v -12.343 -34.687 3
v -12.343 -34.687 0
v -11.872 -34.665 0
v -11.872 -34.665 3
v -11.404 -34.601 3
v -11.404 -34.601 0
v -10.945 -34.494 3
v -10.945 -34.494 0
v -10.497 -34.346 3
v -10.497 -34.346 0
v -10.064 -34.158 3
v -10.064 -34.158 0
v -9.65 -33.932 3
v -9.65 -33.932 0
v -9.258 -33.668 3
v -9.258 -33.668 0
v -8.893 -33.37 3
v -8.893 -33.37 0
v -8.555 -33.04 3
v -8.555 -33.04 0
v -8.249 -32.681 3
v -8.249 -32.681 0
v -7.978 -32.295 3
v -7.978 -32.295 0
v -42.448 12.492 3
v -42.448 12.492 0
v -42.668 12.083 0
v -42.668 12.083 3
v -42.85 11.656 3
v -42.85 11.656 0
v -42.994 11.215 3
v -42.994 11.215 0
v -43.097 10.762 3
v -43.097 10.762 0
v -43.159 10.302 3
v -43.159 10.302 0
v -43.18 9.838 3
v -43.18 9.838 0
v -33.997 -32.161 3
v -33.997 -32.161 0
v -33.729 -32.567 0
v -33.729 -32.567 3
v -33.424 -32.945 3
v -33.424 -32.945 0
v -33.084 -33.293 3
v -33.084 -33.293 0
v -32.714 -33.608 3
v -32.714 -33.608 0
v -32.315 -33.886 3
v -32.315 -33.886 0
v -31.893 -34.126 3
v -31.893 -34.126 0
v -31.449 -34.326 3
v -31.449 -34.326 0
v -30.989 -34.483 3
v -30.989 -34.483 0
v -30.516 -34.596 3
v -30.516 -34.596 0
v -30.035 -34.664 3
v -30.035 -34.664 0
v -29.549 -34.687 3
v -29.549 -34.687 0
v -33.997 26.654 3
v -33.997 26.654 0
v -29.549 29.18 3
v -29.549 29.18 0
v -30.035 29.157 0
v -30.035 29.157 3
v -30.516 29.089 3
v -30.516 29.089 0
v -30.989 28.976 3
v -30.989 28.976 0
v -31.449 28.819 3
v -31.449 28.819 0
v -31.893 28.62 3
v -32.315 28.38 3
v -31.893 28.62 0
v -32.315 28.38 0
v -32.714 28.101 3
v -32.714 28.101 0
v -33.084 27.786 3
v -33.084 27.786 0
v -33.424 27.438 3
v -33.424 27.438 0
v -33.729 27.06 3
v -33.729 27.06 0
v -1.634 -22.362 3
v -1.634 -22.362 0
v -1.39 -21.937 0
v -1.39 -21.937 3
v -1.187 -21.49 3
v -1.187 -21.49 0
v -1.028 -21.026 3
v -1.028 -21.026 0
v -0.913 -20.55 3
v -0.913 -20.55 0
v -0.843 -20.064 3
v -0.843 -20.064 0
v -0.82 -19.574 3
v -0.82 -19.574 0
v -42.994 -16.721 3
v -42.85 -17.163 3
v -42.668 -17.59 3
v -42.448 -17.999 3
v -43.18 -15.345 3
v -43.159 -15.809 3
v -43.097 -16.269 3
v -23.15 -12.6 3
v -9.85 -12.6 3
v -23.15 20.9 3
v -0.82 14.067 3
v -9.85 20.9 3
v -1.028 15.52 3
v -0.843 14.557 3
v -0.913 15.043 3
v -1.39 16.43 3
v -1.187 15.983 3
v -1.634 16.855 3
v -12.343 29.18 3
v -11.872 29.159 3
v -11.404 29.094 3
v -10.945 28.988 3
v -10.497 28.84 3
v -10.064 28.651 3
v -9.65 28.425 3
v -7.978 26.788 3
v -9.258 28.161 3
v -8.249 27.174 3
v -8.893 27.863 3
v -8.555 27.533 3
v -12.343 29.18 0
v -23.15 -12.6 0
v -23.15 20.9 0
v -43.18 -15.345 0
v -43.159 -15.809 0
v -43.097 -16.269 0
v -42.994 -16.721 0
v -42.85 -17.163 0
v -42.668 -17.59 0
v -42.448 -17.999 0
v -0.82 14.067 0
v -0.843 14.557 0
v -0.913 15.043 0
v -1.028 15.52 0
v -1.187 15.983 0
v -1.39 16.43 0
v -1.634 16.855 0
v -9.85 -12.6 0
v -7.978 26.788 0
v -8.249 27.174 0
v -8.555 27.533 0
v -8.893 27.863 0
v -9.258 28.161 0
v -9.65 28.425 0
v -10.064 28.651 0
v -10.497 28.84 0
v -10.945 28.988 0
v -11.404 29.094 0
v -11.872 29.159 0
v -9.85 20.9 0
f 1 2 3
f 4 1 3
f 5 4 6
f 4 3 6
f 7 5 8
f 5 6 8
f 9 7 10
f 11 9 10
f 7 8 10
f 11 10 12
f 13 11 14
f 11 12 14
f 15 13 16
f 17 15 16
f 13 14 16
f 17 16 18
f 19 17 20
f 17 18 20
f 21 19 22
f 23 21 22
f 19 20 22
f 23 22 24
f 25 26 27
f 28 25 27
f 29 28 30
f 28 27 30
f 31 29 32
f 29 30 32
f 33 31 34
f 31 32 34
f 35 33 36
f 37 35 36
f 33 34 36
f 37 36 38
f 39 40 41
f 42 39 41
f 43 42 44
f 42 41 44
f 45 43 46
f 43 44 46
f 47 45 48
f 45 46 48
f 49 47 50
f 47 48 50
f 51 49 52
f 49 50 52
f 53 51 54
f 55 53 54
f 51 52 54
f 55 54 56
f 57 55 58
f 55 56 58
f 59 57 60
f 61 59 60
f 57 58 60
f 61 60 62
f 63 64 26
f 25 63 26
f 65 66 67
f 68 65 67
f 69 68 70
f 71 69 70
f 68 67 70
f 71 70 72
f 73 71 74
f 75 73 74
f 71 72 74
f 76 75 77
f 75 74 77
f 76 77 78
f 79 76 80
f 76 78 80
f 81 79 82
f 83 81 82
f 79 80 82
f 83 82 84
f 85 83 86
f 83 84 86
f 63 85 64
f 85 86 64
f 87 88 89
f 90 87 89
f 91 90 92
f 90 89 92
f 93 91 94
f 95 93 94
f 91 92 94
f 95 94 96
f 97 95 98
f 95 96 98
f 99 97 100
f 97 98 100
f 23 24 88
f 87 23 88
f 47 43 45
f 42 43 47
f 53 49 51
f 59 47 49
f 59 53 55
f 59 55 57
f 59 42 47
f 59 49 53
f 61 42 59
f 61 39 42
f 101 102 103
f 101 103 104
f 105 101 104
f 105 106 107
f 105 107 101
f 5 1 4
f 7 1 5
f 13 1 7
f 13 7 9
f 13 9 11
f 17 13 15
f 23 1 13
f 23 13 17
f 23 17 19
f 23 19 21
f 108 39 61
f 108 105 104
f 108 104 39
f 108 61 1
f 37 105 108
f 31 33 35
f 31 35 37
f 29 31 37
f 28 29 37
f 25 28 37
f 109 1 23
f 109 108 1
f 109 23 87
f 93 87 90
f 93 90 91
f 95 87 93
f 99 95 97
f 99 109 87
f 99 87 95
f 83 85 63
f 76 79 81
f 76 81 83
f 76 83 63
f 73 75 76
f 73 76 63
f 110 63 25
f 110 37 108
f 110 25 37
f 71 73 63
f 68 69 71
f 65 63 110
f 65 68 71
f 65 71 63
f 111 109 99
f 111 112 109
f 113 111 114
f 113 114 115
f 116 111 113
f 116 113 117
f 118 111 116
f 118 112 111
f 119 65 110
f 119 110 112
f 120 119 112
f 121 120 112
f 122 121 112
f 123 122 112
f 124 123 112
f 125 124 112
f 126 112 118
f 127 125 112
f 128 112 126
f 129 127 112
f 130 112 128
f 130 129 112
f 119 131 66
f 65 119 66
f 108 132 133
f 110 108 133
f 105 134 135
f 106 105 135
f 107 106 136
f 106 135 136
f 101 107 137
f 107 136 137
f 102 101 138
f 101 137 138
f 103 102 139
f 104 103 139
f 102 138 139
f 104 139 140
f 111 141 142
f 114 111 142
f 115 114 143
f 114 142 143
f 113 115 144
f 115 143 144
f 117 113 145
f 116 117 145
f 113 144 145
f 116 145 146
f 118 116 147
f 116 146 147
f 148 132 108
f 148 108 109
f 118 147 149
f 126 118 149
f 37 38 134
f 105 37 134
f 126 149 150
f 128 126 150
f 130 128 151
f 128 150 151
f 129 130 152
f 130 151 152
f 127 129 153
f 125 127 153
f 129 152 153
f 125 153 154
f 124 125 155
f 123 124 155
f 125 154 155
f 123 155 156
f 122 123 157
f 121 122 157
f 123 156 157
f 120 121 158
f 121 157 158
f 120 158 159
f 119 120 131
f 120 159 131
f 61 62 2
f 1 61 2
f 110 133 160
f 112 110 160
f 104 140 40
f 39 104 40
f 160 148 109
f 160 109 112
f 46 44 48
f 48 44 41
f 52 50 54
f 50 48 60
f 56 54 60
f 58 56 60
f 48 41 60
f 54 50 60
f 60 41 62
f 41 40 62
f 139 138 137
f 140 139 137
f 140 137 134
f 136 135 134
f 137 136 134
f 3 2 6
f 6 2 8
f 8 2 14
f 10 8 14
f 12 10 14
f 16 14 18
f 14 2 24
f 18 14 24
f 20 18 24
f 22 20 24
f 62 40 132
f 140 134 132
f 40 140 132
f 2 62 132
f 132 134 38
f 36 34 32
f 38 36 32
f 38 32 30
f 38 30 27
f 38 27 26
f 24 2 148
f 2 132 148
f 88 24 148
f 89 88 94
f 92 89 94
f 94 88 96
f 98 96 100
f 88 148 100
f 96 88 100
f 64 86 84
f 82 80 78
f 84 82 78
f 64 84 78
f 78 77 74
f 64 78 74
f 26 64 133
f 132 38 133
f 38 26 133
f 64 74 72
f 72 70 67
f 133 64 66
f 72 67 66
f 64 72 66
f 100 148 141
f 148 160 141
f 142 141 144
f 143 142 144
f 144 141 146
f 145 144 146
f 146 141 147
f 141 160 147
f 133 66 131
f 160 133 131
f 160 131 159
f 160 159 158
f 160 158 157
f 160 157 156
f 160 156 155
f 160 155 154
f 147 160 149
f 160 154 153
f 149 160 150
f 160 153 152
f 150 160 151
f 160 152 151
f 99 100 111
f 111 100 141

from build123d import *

# Parameters (mm, degrees)
SKETCH_1_W      = 13.300240072
SKETCH_1_H      = 33.5
EXTRUDE_1_DEPTH = 3


with BuildPart() as part:
    # ｽｹｯﾁ1 → ﾎﾞｽ - 押し出し1 (new body)
    with BuildSketch(Plane.XY):
        with BuildLine():
            Line((-1.634343126, 16.855350031), (-7.977588702, 26.788033743))
            ThreePointArc((-7.977588702, 26.788033743), (-9.854266456, 28.542819322), (-12.343280841, 29.18))
            Line((-12.343280841, 29.18), (-29.549149223, 29.18))
            ThreePointArc((-29.549149223, 29.18), (-32.106762662, 28.50455475), (-33.997376931, 26.654368145))
            Line((-33.997376931, 26.654368145), (-42.448262973, 12.492253701))
            ThreePointArc((-42.448262973, 12.492253701), (-42.993742281, 11.214580959), (-43.180035265, 9.837885555))
            Line((-43.180035265, 9.837885555), (-43.180035265, -15.34473303))
            ThreePointArc((-43.180035265, -15.34473303), (-42.993742281, -16.721428434), (-42.448262973, -17.999101176))
            Line((-42.448262973, -17.999101176), (-33.997376931, -32.16121562))
            ThreePointArc((-33.997376931, -32.16121562), (-32.106762662, -34.011402225), (-29.549149223, -34.686847475))
            Line((-29.549149223, -34.686847475), (-12.343280841, -34.686847475))
            ThreePointArc((-12.343280841, -34.686847475), (-9.854266456, -34.049666797), (-7.977588702, -32.294881217))
            Line((-7.977588702, -32.294881217), (-1.634343126, -22.362197506))
            ThreePointArc((-1.634343126, -22.362197506), (-1.027777967, -21.026423162), (-0.820035265, -19.574163763))
            Line((-0.820035265, -19.574163763), (-0.820035265, 14.067316288))
            ThreePointArc((-0.820035265, 14.067316288), (-1.027777967, 15.519575687), (-1.634343126, 16.855350031))
        make_face()
        with Locations((-16.499940321, 4.15)):
            Rectangle(SKETCH_1_W, SKETCH_1_H, mode=Mode.SUBTRACT)
    extrude(amount=EXTRUDE_1_DEPTH)


solid = part.part
